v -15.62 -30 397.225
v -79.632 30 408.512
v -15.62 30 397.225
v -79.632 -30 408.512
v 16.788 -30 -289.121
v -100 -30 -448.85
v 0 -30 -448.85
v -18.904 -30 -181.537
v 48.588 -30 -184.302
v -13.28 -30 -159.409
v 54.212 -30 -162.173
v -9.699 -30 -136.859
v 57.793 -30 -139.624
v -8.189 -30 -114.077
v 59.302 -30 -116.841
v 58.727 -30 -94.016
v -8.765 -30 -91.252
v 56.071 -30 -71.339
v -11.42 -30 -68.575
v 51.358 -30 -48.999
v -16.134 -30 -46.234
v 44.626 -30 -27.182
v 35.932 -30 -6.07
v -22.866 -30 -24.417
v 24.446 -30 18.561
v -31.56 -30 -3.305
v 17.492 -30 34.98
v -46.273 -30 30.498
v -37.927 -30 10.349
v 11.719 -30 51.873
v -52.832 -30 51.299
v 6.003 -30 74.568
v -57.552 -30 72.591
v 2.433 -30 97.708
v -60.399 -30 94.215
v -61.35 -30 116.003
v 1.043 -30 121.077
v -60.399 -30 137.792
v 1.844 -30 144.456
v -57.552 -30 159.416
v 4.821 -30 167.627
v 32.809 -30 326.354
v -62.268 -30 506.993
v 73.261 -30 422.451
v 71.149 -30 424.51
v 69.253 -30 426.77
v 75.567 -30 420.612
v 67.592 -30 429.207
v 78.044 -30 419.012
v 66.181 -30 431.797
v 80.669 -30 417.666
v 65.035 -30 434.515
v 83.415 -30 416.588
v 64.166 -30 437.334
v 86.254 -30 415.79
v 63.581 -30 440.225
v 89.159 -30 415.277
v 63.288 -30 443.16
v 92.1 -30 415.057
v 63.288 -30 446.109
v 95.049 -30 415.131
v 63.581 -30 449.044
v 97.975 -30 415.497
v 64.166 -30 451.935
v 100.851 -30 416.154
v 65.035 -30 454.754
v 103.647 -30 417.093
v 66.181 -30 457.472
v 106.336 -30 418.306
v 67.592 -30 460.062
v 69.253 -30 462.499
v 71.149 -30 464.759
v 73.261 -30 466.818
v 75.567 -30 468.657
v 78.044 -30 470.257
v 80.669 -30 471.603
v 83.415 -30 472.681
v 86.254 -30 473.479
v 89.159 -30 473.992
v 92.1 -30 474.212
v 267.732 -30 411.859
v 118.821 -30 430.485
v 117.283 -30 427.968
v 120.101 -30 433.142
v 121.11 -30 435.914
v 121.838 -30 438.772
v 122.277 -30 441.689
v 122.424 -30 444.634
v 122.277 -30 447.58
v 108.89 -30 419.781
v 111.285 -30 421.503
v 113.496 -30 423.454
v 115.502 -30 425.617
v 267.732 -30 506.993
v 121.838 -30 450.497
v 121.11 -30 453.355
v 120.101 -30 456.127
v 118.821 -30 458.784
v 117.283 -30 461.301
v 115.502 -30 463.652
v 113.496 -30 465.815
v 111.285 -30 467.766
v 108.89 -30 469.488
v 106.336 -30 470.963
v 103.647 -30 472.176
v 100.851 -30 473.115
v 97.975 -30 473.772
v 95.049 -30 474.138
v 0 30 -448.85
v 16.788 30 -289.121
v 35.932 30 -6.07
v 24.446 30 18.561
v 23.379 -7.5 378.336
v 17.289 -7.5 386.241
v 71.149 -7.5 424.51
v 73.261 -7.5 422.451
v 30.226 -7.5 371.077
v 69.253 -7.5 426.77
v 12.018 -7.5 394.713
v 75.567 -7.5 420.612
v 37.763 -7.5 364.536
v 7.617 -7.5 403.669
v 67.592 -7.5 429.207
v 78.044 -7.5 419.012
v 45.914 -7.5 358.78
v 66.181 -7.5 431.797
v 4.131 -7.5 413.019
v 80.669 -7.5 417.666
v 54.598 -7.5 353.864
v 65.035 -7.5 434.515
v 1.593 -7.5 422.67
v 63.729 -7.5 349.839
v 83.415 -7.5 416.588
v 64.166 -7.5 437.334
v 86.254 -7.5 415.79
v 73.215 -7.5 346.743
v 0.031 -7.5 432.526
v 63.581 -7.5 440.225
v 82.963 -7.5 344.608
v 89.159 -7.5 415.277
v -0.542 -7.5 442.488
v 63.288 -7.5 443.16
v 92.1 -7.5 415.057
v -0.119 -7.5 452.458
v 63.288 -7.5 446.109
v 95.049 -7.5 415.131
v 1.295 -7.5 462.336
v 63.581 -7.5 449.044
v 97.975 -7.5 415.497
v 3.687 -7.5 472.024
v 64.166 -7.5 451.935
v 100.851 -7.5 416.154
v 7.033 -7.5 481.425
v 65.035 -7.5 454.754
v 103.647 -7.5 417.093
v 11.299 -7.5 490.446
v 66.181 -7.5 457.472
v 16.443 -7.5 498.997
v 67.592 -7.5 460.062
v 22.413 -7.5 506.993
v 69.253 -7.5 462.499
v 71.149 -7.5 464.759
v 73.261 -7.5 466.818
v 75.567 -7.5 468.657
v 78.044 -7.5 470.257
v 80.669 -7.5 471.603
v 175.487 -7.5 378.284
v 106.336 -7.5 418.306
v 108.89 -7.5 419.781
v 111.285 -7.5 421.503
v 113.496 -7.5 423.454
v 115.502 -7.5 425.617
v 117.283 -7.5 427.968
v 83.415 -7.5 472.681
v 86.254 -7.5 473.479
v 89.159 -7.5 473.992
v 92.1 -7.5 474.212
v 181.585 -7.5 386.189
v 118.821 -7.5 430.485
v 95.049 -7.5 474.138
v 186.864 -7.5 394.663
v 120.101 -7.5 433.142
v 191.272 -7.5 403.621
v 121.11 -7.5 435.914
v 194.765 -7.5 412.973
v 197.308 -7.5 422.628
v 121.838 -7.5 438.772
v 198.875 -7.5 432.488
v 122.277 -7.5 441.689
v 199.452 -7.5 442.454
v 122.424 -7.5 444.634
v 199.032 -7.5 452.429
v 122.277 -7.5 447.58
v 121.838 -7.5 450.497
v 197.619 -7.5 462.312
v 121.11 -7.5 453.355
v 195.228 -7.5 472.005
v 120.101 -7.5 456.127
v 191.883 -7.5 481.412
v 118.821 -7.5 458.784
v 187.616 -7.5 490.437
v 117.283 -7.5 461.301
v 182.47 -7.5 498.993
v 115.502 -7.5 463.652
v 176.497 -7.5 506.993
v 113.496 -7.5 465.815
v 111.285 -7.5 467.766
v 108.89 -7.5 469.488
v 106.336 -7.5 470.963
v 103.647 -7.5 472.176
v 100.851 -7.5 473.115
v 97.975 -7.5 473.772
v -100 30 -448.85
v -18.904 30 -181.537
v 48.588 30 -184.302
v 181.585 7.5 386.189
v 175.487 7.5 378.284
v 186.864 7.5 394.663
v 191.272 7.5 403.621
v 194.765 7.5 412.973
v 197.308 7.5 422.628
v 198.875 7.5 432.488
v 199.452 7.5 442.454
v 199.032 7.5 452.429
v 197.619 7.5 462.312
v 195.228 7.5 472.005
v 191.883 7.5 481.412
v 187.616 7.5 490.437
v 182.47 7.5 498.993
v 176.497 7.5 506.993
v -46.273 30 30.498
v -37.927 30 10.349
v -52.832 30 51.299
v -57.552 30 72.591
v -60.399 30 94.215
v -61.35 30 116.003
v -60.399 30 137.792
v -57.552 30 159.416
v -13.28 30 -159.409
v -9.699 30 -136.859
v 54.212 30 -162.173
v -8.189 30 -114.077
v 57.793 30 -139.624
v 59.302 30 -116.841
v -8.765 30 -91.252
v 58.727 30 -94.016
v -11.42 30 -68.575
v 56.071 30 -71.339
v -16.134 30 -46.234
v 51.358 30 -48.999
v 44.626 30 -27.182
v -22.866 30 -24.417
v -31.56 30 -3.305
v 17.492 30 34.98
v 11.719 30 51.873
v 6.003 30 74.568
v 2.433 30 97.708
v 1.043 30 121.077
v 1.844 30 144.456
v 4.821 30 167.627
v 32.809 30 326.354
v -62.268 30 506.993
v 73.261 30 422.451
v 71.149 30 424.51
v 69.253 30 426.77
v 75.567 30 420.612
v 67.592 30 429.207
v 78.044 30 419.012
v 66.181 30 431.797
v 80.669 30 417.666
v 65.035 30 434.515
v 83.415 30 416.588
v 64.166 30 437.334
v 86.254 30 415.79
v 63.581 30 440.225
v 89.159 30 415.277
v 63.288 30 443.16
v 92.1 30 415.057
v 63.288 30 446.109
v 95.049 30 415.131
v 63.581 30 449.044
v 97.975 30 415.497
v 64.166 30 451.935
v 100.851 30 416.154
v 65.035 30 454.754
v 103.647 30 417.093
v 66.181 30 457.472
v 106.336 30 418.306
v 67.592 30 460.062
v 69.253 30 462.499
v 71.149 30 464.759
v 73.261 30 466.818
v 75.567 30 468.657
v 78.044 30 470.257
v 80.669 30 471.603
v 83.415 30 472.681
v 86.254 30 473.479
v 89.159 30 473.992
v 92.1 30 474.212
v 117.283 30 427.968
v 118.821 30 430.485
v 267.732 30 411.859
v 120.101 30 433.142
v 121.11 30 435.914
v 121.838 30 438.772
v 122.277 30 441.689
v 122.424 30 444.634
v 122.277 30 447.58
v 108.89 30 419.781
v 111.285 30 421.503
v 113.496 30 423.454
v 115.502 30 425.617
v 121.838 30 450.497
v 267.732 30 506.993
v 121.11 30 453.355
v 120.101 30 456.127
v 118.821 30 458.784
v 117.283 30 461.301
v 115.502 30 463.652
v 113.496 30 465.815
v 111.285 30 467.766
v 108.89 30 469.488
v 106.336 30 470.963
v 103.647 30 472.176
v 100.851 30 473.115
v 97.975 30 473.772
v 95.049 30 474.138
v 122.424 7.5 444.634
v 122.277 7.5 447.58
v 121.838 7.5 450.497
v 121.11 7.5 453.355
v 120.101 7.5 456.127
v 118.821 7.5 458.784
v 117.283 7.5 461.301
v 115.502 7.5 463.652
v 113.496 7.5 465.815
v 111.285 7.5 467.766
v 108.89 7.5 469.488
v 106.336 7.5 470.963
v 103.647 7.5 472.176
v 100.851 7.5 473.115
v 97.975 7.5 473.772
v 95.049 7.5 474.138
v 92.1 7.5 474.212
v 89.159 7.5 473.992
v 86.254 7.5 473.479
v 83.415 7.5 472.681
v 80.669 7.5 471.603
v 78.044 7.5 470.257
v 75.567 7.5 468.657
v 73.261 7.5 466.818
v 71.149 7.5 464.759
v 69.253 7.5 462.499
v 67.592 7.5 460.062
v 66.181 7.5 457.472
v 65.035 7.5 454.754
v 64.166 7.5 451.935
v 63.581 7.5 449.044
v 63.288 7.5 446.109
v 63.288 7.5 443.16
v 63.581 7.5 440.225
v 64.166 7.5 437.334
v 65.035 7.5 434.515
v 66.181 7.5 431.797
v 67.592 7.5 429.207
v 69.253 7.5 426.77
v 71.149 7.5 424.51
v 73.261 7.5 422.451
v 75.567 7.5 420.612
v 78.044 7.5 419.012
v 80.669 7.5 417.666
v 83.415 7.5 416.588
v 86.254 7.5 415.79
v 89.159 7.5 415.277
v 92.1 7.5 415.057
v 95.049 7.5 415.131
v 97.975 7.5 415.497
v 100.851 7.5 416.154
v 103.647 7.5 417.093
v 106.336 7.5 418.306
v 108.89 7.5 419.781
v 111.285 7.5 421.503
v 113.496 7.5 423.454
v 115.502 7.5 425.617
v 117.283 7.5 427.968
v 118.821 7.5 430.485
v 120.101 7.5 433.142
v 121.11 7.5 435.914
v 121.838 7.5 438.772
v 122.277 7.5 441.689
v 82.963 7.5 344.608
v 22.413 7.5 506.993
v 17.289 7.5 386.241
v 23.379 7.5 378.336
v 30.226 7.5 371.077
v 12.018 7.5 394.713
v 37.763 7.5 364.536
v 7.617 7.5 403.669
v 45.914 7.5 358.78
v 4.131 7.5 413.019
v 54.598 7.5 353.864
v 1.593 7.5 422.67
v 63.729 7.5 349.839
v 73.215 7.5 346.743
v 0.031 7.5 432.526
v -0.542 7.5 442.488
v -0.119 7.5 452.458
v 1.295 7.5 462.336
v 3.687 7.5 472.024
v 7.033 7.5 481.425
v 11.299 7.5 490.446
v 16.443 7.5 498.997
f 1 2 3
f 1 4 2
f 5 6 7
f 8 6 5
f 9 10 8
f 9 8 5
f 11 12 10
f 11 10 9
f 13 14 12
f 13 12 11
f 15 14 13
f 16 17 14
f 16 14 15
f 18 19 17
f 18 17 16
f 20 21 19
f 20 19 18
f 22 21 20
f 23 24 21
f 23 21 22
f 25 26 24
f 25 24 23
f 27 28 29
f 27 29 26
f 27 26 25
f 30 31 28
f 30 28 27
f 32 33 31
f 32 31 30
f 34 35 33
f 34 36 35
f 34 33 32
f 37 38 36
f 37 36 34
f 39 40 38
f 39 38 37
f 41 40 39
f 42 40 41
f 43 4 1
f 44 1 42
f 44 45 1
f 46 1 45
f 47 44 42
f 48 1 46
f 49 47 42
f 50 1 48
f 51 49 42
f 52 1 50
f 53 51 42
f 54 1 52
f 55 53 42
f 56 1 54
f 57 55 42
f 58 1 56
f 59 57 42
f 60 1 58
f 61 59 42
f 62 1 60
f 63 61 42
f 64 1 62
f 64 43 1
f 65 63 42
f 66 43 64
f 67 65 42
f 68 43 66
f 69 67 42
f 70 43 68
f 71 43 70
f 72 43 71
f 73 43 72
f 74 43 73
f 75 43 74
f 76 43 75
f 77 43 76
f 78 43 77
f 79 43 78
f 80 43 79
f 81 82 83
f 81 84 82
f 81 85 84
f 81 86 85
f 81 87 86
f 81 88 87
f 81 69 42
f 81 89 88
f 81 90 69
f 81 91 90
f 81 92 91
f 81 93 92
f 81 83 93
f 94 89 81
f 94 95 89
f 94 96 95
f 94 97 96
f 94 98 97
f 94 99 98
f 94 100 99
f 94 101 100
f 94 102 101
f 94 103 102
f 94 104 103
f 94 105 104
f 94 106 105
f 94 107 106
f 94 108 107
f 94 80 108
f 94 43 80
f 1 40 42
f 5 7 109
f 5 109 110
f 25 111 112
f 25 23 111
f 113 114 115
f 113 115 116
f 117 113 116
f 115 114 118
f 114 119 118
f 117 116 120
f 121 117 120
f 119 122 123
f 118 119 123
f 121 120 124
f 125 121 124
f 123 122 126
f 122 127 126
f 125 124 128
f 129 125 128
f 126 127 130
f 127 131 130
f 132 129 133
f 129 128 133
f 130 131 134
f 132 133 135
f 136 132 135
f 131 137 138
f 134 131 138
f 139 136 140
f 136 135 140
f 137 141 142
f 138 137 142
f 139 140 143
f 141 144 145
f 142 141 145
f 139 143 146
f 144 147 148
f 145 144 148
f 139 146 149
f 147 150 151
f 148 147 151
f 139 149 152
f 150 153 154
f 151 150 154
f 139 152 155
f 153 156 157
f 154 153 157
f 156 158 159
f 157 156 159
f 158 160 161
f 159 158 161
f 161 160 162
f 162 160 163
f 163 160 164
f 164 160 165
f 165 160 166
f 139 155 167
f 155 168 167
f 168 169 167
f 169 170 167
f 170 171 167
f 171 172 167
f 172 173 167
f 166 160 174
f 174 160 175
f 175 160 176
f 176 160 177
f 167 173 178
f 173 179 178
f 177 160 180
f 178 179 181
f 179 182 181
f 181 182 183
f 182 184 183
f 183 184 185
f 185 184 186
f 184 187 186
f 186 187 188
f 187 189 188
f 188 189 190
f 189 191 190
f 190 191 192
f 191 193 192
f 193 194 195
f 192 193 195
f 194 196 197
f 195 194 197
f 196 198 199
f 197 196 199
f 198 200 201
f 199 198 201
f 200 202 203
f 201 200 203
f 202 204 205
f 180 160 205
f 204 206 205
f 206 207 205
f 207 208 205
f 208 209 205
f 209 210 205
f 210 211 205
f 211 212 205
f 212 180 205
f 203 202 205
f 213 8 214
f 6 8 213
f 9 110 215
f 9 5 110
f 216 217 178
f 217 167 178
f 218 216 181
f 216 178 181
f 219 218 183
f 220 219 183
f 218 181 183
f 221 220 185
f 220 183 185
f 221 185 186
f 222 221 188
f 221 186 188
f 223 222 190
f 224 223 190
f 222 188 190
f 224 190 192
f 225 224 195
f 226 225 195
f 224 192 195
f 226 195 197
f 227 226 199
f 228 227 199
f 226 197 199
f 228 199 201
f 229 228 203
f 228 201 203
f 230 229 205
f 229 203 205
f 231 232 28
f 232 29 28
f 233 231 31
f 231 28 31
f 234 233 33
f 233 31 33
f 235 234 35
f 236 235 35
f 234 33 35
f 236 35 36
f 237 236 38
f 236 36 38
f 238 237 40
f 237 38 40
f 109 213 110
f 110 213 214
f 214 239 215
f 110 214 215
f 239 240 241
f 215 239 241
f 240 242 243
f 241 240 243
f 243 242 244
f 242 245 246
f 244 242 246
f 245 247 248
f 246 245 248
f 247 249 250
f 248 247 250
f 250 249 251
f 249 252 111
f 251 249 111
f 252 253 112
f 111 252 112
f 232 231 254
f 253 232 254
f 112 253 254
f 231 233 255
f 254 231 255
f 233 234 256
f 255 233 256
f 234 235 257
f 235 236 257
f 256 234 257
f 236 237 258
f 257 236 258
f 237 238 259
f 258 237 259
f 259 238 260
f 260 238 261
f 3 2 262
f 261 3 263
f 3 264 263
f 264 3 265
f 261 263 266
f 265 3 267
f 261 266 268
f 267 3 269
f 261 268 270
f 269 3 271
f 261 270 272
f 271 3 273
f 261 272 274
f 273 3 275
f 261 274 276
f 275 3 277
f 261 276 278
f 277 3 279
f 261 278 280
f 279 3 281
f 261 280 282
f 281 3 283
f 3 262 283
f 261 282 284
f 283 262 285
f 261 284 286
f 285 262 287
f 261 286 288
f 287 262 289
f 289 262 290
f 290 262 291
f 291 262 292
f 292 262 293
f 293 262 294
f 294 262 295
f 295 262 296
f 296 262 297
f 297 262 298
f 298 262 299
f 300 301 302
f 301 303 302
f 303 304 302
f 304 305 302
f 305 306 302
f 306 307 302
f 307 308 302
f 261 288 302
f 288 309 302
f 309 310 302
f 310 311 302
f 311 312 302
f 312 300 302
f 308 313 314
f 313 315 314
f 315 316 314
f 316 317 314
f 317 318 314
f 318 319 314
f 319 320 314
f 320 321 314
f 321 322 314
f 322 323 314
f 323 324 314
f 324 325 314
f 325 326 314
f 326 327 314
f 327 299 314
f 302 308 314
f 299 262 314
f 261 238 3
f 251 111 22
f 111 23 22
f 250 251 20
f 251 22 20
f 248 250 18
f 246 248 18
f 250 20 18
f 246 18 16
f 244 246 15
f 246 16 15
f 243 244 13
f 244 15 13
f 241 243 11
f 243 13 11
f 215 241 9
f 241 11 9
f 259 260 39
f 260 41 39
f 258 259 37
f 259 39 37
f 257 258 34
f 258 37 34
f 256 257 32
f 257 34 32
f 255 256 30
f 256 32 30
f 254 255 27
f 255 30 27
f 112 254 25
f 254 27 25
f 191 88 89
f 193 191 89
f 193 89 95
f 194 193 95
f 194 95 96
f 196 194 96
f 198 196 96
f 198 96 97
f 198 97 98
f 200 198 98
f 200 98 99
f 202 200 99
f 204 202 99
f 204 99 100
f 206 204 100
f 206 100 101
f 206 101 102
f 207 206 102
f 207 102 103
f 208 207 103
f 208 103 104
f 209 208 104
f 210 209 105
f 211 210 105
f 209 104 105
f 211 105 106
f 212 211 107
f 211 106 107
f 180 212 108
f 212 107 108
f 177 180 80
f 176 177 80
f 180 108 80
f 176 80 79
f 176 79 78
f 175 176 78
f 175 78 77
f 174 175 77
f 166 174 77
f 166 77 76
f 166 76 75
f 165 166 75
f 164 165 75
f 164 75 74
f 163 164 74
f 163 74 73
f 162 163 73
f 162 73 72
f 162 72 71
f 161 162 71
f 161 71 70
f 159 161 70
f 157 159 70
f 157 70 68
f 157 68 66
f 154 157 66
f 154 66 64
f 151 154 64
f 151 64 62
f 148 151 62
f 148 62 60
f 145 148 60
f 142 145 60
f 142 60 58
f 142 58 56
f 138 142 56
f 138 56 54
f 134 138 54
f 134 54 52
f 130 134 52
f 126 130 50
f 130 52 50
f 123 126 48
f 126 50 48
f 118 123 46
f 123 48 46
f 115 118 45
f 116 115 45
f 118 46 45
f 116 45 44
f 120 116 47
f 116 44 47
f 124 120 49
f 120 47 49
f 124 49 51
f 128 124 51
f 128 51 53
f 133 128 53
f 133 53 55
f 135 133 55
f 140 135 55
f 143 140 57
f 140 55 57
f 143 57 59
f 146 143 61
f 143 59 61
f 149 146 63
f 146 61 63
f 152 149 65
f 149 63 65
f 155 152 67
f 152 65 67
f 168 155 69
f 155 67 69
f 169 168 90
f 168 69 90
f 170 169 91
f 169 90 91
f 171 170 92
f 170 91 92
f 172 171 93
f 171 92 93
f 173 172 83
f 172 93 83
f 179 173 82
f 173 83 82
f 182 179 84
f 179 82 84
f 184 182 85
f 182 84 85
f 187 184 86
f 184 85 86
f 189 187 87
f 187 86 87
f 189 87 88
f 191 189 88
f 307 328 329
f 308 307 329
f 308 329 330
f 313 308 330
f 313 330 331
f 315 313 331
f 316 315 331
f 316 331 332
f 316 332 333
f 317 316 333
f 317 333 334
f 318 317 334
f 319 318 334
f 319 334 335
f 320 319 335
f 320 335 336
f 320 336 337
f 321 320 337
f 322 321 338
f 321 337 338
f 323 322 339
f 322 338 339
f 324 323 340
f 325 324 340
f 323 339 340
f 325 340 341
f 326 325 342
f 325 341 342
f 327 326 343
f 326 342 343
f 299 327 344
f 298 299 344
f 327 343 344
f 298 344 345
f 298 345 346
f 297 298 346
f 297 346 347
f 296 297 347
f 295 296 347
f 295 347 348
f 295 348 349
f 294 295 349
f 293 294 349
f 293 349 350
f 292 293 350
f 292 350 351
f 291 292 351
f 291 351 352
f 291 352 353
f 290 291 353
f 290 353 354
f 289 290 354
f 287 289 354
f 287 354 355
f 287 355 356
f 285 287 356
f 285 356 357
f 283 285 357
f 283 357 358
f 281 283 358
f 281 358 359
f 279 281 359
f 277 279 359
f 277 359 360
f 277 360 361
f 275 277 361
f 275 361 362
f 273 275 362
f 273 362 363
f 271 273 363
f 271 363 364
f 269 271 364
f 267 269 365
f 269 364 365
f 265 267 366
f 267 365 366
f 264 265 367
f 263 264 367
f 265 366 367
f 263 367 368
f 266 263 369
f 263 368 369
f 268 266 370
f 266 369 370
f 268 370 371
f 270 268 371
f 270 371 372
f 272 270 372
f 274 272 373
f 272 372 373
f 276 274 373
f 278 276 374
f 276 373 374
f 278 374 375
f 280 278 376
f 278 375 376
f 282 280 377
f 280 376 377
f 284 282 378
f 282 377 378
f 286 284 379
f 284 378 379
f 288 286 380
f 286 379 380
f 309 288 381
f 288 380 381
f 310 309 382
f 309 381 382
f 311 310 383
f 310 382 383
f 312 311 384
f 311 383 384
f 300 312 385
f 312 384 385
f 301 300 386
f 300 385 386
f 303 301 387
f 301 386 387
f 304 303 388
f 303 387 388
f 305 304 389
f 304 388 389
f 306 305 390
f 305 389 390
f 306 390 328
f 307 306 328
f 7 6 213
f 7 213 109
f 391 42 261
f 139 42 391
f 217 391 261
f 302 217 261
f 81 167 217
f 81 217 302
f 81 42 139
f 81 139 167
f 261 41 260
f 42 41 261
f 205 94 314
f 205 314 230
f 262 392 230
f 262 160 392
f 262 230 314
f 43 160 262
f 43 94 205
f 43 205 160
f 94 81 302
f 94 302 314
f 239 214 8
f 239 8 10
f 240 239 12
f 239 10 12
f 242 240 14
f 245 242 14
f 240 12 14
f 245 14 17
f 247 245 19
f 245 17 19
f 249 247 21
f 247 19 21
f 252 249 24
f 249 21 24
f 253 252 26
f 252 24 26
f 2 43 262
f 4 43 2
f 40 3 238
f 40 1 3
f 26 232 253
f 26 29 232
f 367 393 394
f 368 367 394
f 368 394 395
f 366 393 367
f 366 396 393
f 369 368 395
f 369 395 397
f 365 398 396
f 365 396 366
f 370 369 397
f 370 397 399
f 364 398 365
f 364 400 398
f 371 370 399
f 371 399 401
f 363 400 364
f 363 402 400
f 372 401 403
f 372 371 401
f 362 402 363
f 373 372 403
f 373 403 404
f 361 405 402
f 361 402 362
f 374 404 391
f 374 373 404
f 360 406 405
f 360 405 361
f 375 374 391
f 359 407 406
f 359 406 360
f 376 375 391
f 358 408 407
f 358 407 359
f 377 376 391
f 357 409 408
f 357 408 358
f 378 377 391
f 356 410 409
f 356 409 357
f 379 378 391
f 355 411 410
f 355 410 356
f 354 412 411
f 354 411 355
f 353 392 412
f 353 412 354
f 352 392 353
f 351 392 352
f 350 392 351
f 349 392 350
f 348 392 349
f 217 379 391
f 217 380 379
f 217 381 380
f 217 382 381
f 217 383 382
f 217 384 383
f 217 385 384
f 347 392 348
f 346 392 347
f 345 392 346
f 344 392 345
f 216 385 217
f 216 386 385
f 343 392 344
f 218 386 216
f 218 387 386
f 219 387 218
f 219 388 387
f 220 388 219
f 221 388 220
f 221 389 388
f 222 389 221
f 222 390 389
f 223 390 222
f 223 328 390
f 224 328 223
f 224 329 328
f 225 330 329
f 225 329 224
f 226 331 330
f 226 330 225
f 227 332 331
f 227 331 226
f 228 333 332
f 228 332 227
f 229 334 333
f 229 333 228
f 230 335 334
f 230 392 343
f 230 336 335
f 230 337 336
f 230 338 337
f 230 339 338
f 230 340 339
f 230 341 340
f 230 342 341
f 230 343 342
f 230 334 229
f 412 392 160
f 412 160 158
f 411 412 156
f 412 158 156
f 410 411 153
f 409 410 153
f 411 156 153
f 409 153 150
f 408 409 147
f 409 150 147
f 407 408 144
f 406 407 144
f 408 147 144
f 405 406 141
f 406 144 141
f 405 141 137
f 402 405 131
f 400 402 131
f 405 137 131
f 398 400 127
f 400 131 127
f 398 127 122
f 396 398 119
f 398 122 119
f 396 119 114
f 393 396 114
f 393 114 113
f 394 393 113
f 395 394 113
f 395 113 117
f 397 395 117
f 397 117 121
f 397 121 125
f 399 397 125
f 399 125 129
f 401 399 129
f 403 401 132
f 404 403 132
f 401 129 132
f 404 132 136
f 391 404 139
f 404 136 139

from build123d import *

# Parameters (mm, degrees)
F1_DEPTH = 30
F2_R     = 250
F3_R     = 29.586719
F4_DEPTH = 60.001
F5_R     = 100
F6_DEPTH = 7.5


with BuildPart() as f1:
    # F0 (on Front) → F1 (new body, symmetric)
    with BuildSketch(Plane.XZ):
        Polygon((-79.632452, 408.511814), (-15.619948, 397.224683), (-71.23988, 81.788369), (8.866352, -90), (-100, -448.849714), (0, -448.849714), (16.78813, -289.121331), (76.358088, -92.764401), (0, 70.986047), (-8.866352, 90), (0, 140.283579), (32.809211, 326.353861), (267.732366, 411.858897), (267.732366, 506.99259), (-62.267634, 506.99259), align=None)
    extrude(amount=F1_DEPTH, both=True)

    # F2
    f2_edges = [f1.edges().sort_by_distance(p)[0] for p in [
        (-8.866352, 0, 90),
        (76.358088, 0, -92.764401),
        (-71.23988, 0, 81.788369),
        (8.866352, 0, -90),
    ]]
    fillet(f2_edges, radius=F2_R)

    # F3 (on face) → F4 (cut, through all)
    with BuildSketch(Plane.XZ.offset(30)):
        with Locations((92.837751, 444.634497)):
            Circle(F3_R)
    extrude(amount=-F4_DEPTH, mode=Mode.SUBTRACT)

    # F5 (on Front) → F6 (cut, symmetric)
    with BuildSketch(Plane.XZ):
        with Locations((99.455066, 443.239033)):
            Circle(F5_R)
    extrude(amount=F6_DEPTH, both=True, mode=Mode.SUBTRACT)


solid = f1.part
